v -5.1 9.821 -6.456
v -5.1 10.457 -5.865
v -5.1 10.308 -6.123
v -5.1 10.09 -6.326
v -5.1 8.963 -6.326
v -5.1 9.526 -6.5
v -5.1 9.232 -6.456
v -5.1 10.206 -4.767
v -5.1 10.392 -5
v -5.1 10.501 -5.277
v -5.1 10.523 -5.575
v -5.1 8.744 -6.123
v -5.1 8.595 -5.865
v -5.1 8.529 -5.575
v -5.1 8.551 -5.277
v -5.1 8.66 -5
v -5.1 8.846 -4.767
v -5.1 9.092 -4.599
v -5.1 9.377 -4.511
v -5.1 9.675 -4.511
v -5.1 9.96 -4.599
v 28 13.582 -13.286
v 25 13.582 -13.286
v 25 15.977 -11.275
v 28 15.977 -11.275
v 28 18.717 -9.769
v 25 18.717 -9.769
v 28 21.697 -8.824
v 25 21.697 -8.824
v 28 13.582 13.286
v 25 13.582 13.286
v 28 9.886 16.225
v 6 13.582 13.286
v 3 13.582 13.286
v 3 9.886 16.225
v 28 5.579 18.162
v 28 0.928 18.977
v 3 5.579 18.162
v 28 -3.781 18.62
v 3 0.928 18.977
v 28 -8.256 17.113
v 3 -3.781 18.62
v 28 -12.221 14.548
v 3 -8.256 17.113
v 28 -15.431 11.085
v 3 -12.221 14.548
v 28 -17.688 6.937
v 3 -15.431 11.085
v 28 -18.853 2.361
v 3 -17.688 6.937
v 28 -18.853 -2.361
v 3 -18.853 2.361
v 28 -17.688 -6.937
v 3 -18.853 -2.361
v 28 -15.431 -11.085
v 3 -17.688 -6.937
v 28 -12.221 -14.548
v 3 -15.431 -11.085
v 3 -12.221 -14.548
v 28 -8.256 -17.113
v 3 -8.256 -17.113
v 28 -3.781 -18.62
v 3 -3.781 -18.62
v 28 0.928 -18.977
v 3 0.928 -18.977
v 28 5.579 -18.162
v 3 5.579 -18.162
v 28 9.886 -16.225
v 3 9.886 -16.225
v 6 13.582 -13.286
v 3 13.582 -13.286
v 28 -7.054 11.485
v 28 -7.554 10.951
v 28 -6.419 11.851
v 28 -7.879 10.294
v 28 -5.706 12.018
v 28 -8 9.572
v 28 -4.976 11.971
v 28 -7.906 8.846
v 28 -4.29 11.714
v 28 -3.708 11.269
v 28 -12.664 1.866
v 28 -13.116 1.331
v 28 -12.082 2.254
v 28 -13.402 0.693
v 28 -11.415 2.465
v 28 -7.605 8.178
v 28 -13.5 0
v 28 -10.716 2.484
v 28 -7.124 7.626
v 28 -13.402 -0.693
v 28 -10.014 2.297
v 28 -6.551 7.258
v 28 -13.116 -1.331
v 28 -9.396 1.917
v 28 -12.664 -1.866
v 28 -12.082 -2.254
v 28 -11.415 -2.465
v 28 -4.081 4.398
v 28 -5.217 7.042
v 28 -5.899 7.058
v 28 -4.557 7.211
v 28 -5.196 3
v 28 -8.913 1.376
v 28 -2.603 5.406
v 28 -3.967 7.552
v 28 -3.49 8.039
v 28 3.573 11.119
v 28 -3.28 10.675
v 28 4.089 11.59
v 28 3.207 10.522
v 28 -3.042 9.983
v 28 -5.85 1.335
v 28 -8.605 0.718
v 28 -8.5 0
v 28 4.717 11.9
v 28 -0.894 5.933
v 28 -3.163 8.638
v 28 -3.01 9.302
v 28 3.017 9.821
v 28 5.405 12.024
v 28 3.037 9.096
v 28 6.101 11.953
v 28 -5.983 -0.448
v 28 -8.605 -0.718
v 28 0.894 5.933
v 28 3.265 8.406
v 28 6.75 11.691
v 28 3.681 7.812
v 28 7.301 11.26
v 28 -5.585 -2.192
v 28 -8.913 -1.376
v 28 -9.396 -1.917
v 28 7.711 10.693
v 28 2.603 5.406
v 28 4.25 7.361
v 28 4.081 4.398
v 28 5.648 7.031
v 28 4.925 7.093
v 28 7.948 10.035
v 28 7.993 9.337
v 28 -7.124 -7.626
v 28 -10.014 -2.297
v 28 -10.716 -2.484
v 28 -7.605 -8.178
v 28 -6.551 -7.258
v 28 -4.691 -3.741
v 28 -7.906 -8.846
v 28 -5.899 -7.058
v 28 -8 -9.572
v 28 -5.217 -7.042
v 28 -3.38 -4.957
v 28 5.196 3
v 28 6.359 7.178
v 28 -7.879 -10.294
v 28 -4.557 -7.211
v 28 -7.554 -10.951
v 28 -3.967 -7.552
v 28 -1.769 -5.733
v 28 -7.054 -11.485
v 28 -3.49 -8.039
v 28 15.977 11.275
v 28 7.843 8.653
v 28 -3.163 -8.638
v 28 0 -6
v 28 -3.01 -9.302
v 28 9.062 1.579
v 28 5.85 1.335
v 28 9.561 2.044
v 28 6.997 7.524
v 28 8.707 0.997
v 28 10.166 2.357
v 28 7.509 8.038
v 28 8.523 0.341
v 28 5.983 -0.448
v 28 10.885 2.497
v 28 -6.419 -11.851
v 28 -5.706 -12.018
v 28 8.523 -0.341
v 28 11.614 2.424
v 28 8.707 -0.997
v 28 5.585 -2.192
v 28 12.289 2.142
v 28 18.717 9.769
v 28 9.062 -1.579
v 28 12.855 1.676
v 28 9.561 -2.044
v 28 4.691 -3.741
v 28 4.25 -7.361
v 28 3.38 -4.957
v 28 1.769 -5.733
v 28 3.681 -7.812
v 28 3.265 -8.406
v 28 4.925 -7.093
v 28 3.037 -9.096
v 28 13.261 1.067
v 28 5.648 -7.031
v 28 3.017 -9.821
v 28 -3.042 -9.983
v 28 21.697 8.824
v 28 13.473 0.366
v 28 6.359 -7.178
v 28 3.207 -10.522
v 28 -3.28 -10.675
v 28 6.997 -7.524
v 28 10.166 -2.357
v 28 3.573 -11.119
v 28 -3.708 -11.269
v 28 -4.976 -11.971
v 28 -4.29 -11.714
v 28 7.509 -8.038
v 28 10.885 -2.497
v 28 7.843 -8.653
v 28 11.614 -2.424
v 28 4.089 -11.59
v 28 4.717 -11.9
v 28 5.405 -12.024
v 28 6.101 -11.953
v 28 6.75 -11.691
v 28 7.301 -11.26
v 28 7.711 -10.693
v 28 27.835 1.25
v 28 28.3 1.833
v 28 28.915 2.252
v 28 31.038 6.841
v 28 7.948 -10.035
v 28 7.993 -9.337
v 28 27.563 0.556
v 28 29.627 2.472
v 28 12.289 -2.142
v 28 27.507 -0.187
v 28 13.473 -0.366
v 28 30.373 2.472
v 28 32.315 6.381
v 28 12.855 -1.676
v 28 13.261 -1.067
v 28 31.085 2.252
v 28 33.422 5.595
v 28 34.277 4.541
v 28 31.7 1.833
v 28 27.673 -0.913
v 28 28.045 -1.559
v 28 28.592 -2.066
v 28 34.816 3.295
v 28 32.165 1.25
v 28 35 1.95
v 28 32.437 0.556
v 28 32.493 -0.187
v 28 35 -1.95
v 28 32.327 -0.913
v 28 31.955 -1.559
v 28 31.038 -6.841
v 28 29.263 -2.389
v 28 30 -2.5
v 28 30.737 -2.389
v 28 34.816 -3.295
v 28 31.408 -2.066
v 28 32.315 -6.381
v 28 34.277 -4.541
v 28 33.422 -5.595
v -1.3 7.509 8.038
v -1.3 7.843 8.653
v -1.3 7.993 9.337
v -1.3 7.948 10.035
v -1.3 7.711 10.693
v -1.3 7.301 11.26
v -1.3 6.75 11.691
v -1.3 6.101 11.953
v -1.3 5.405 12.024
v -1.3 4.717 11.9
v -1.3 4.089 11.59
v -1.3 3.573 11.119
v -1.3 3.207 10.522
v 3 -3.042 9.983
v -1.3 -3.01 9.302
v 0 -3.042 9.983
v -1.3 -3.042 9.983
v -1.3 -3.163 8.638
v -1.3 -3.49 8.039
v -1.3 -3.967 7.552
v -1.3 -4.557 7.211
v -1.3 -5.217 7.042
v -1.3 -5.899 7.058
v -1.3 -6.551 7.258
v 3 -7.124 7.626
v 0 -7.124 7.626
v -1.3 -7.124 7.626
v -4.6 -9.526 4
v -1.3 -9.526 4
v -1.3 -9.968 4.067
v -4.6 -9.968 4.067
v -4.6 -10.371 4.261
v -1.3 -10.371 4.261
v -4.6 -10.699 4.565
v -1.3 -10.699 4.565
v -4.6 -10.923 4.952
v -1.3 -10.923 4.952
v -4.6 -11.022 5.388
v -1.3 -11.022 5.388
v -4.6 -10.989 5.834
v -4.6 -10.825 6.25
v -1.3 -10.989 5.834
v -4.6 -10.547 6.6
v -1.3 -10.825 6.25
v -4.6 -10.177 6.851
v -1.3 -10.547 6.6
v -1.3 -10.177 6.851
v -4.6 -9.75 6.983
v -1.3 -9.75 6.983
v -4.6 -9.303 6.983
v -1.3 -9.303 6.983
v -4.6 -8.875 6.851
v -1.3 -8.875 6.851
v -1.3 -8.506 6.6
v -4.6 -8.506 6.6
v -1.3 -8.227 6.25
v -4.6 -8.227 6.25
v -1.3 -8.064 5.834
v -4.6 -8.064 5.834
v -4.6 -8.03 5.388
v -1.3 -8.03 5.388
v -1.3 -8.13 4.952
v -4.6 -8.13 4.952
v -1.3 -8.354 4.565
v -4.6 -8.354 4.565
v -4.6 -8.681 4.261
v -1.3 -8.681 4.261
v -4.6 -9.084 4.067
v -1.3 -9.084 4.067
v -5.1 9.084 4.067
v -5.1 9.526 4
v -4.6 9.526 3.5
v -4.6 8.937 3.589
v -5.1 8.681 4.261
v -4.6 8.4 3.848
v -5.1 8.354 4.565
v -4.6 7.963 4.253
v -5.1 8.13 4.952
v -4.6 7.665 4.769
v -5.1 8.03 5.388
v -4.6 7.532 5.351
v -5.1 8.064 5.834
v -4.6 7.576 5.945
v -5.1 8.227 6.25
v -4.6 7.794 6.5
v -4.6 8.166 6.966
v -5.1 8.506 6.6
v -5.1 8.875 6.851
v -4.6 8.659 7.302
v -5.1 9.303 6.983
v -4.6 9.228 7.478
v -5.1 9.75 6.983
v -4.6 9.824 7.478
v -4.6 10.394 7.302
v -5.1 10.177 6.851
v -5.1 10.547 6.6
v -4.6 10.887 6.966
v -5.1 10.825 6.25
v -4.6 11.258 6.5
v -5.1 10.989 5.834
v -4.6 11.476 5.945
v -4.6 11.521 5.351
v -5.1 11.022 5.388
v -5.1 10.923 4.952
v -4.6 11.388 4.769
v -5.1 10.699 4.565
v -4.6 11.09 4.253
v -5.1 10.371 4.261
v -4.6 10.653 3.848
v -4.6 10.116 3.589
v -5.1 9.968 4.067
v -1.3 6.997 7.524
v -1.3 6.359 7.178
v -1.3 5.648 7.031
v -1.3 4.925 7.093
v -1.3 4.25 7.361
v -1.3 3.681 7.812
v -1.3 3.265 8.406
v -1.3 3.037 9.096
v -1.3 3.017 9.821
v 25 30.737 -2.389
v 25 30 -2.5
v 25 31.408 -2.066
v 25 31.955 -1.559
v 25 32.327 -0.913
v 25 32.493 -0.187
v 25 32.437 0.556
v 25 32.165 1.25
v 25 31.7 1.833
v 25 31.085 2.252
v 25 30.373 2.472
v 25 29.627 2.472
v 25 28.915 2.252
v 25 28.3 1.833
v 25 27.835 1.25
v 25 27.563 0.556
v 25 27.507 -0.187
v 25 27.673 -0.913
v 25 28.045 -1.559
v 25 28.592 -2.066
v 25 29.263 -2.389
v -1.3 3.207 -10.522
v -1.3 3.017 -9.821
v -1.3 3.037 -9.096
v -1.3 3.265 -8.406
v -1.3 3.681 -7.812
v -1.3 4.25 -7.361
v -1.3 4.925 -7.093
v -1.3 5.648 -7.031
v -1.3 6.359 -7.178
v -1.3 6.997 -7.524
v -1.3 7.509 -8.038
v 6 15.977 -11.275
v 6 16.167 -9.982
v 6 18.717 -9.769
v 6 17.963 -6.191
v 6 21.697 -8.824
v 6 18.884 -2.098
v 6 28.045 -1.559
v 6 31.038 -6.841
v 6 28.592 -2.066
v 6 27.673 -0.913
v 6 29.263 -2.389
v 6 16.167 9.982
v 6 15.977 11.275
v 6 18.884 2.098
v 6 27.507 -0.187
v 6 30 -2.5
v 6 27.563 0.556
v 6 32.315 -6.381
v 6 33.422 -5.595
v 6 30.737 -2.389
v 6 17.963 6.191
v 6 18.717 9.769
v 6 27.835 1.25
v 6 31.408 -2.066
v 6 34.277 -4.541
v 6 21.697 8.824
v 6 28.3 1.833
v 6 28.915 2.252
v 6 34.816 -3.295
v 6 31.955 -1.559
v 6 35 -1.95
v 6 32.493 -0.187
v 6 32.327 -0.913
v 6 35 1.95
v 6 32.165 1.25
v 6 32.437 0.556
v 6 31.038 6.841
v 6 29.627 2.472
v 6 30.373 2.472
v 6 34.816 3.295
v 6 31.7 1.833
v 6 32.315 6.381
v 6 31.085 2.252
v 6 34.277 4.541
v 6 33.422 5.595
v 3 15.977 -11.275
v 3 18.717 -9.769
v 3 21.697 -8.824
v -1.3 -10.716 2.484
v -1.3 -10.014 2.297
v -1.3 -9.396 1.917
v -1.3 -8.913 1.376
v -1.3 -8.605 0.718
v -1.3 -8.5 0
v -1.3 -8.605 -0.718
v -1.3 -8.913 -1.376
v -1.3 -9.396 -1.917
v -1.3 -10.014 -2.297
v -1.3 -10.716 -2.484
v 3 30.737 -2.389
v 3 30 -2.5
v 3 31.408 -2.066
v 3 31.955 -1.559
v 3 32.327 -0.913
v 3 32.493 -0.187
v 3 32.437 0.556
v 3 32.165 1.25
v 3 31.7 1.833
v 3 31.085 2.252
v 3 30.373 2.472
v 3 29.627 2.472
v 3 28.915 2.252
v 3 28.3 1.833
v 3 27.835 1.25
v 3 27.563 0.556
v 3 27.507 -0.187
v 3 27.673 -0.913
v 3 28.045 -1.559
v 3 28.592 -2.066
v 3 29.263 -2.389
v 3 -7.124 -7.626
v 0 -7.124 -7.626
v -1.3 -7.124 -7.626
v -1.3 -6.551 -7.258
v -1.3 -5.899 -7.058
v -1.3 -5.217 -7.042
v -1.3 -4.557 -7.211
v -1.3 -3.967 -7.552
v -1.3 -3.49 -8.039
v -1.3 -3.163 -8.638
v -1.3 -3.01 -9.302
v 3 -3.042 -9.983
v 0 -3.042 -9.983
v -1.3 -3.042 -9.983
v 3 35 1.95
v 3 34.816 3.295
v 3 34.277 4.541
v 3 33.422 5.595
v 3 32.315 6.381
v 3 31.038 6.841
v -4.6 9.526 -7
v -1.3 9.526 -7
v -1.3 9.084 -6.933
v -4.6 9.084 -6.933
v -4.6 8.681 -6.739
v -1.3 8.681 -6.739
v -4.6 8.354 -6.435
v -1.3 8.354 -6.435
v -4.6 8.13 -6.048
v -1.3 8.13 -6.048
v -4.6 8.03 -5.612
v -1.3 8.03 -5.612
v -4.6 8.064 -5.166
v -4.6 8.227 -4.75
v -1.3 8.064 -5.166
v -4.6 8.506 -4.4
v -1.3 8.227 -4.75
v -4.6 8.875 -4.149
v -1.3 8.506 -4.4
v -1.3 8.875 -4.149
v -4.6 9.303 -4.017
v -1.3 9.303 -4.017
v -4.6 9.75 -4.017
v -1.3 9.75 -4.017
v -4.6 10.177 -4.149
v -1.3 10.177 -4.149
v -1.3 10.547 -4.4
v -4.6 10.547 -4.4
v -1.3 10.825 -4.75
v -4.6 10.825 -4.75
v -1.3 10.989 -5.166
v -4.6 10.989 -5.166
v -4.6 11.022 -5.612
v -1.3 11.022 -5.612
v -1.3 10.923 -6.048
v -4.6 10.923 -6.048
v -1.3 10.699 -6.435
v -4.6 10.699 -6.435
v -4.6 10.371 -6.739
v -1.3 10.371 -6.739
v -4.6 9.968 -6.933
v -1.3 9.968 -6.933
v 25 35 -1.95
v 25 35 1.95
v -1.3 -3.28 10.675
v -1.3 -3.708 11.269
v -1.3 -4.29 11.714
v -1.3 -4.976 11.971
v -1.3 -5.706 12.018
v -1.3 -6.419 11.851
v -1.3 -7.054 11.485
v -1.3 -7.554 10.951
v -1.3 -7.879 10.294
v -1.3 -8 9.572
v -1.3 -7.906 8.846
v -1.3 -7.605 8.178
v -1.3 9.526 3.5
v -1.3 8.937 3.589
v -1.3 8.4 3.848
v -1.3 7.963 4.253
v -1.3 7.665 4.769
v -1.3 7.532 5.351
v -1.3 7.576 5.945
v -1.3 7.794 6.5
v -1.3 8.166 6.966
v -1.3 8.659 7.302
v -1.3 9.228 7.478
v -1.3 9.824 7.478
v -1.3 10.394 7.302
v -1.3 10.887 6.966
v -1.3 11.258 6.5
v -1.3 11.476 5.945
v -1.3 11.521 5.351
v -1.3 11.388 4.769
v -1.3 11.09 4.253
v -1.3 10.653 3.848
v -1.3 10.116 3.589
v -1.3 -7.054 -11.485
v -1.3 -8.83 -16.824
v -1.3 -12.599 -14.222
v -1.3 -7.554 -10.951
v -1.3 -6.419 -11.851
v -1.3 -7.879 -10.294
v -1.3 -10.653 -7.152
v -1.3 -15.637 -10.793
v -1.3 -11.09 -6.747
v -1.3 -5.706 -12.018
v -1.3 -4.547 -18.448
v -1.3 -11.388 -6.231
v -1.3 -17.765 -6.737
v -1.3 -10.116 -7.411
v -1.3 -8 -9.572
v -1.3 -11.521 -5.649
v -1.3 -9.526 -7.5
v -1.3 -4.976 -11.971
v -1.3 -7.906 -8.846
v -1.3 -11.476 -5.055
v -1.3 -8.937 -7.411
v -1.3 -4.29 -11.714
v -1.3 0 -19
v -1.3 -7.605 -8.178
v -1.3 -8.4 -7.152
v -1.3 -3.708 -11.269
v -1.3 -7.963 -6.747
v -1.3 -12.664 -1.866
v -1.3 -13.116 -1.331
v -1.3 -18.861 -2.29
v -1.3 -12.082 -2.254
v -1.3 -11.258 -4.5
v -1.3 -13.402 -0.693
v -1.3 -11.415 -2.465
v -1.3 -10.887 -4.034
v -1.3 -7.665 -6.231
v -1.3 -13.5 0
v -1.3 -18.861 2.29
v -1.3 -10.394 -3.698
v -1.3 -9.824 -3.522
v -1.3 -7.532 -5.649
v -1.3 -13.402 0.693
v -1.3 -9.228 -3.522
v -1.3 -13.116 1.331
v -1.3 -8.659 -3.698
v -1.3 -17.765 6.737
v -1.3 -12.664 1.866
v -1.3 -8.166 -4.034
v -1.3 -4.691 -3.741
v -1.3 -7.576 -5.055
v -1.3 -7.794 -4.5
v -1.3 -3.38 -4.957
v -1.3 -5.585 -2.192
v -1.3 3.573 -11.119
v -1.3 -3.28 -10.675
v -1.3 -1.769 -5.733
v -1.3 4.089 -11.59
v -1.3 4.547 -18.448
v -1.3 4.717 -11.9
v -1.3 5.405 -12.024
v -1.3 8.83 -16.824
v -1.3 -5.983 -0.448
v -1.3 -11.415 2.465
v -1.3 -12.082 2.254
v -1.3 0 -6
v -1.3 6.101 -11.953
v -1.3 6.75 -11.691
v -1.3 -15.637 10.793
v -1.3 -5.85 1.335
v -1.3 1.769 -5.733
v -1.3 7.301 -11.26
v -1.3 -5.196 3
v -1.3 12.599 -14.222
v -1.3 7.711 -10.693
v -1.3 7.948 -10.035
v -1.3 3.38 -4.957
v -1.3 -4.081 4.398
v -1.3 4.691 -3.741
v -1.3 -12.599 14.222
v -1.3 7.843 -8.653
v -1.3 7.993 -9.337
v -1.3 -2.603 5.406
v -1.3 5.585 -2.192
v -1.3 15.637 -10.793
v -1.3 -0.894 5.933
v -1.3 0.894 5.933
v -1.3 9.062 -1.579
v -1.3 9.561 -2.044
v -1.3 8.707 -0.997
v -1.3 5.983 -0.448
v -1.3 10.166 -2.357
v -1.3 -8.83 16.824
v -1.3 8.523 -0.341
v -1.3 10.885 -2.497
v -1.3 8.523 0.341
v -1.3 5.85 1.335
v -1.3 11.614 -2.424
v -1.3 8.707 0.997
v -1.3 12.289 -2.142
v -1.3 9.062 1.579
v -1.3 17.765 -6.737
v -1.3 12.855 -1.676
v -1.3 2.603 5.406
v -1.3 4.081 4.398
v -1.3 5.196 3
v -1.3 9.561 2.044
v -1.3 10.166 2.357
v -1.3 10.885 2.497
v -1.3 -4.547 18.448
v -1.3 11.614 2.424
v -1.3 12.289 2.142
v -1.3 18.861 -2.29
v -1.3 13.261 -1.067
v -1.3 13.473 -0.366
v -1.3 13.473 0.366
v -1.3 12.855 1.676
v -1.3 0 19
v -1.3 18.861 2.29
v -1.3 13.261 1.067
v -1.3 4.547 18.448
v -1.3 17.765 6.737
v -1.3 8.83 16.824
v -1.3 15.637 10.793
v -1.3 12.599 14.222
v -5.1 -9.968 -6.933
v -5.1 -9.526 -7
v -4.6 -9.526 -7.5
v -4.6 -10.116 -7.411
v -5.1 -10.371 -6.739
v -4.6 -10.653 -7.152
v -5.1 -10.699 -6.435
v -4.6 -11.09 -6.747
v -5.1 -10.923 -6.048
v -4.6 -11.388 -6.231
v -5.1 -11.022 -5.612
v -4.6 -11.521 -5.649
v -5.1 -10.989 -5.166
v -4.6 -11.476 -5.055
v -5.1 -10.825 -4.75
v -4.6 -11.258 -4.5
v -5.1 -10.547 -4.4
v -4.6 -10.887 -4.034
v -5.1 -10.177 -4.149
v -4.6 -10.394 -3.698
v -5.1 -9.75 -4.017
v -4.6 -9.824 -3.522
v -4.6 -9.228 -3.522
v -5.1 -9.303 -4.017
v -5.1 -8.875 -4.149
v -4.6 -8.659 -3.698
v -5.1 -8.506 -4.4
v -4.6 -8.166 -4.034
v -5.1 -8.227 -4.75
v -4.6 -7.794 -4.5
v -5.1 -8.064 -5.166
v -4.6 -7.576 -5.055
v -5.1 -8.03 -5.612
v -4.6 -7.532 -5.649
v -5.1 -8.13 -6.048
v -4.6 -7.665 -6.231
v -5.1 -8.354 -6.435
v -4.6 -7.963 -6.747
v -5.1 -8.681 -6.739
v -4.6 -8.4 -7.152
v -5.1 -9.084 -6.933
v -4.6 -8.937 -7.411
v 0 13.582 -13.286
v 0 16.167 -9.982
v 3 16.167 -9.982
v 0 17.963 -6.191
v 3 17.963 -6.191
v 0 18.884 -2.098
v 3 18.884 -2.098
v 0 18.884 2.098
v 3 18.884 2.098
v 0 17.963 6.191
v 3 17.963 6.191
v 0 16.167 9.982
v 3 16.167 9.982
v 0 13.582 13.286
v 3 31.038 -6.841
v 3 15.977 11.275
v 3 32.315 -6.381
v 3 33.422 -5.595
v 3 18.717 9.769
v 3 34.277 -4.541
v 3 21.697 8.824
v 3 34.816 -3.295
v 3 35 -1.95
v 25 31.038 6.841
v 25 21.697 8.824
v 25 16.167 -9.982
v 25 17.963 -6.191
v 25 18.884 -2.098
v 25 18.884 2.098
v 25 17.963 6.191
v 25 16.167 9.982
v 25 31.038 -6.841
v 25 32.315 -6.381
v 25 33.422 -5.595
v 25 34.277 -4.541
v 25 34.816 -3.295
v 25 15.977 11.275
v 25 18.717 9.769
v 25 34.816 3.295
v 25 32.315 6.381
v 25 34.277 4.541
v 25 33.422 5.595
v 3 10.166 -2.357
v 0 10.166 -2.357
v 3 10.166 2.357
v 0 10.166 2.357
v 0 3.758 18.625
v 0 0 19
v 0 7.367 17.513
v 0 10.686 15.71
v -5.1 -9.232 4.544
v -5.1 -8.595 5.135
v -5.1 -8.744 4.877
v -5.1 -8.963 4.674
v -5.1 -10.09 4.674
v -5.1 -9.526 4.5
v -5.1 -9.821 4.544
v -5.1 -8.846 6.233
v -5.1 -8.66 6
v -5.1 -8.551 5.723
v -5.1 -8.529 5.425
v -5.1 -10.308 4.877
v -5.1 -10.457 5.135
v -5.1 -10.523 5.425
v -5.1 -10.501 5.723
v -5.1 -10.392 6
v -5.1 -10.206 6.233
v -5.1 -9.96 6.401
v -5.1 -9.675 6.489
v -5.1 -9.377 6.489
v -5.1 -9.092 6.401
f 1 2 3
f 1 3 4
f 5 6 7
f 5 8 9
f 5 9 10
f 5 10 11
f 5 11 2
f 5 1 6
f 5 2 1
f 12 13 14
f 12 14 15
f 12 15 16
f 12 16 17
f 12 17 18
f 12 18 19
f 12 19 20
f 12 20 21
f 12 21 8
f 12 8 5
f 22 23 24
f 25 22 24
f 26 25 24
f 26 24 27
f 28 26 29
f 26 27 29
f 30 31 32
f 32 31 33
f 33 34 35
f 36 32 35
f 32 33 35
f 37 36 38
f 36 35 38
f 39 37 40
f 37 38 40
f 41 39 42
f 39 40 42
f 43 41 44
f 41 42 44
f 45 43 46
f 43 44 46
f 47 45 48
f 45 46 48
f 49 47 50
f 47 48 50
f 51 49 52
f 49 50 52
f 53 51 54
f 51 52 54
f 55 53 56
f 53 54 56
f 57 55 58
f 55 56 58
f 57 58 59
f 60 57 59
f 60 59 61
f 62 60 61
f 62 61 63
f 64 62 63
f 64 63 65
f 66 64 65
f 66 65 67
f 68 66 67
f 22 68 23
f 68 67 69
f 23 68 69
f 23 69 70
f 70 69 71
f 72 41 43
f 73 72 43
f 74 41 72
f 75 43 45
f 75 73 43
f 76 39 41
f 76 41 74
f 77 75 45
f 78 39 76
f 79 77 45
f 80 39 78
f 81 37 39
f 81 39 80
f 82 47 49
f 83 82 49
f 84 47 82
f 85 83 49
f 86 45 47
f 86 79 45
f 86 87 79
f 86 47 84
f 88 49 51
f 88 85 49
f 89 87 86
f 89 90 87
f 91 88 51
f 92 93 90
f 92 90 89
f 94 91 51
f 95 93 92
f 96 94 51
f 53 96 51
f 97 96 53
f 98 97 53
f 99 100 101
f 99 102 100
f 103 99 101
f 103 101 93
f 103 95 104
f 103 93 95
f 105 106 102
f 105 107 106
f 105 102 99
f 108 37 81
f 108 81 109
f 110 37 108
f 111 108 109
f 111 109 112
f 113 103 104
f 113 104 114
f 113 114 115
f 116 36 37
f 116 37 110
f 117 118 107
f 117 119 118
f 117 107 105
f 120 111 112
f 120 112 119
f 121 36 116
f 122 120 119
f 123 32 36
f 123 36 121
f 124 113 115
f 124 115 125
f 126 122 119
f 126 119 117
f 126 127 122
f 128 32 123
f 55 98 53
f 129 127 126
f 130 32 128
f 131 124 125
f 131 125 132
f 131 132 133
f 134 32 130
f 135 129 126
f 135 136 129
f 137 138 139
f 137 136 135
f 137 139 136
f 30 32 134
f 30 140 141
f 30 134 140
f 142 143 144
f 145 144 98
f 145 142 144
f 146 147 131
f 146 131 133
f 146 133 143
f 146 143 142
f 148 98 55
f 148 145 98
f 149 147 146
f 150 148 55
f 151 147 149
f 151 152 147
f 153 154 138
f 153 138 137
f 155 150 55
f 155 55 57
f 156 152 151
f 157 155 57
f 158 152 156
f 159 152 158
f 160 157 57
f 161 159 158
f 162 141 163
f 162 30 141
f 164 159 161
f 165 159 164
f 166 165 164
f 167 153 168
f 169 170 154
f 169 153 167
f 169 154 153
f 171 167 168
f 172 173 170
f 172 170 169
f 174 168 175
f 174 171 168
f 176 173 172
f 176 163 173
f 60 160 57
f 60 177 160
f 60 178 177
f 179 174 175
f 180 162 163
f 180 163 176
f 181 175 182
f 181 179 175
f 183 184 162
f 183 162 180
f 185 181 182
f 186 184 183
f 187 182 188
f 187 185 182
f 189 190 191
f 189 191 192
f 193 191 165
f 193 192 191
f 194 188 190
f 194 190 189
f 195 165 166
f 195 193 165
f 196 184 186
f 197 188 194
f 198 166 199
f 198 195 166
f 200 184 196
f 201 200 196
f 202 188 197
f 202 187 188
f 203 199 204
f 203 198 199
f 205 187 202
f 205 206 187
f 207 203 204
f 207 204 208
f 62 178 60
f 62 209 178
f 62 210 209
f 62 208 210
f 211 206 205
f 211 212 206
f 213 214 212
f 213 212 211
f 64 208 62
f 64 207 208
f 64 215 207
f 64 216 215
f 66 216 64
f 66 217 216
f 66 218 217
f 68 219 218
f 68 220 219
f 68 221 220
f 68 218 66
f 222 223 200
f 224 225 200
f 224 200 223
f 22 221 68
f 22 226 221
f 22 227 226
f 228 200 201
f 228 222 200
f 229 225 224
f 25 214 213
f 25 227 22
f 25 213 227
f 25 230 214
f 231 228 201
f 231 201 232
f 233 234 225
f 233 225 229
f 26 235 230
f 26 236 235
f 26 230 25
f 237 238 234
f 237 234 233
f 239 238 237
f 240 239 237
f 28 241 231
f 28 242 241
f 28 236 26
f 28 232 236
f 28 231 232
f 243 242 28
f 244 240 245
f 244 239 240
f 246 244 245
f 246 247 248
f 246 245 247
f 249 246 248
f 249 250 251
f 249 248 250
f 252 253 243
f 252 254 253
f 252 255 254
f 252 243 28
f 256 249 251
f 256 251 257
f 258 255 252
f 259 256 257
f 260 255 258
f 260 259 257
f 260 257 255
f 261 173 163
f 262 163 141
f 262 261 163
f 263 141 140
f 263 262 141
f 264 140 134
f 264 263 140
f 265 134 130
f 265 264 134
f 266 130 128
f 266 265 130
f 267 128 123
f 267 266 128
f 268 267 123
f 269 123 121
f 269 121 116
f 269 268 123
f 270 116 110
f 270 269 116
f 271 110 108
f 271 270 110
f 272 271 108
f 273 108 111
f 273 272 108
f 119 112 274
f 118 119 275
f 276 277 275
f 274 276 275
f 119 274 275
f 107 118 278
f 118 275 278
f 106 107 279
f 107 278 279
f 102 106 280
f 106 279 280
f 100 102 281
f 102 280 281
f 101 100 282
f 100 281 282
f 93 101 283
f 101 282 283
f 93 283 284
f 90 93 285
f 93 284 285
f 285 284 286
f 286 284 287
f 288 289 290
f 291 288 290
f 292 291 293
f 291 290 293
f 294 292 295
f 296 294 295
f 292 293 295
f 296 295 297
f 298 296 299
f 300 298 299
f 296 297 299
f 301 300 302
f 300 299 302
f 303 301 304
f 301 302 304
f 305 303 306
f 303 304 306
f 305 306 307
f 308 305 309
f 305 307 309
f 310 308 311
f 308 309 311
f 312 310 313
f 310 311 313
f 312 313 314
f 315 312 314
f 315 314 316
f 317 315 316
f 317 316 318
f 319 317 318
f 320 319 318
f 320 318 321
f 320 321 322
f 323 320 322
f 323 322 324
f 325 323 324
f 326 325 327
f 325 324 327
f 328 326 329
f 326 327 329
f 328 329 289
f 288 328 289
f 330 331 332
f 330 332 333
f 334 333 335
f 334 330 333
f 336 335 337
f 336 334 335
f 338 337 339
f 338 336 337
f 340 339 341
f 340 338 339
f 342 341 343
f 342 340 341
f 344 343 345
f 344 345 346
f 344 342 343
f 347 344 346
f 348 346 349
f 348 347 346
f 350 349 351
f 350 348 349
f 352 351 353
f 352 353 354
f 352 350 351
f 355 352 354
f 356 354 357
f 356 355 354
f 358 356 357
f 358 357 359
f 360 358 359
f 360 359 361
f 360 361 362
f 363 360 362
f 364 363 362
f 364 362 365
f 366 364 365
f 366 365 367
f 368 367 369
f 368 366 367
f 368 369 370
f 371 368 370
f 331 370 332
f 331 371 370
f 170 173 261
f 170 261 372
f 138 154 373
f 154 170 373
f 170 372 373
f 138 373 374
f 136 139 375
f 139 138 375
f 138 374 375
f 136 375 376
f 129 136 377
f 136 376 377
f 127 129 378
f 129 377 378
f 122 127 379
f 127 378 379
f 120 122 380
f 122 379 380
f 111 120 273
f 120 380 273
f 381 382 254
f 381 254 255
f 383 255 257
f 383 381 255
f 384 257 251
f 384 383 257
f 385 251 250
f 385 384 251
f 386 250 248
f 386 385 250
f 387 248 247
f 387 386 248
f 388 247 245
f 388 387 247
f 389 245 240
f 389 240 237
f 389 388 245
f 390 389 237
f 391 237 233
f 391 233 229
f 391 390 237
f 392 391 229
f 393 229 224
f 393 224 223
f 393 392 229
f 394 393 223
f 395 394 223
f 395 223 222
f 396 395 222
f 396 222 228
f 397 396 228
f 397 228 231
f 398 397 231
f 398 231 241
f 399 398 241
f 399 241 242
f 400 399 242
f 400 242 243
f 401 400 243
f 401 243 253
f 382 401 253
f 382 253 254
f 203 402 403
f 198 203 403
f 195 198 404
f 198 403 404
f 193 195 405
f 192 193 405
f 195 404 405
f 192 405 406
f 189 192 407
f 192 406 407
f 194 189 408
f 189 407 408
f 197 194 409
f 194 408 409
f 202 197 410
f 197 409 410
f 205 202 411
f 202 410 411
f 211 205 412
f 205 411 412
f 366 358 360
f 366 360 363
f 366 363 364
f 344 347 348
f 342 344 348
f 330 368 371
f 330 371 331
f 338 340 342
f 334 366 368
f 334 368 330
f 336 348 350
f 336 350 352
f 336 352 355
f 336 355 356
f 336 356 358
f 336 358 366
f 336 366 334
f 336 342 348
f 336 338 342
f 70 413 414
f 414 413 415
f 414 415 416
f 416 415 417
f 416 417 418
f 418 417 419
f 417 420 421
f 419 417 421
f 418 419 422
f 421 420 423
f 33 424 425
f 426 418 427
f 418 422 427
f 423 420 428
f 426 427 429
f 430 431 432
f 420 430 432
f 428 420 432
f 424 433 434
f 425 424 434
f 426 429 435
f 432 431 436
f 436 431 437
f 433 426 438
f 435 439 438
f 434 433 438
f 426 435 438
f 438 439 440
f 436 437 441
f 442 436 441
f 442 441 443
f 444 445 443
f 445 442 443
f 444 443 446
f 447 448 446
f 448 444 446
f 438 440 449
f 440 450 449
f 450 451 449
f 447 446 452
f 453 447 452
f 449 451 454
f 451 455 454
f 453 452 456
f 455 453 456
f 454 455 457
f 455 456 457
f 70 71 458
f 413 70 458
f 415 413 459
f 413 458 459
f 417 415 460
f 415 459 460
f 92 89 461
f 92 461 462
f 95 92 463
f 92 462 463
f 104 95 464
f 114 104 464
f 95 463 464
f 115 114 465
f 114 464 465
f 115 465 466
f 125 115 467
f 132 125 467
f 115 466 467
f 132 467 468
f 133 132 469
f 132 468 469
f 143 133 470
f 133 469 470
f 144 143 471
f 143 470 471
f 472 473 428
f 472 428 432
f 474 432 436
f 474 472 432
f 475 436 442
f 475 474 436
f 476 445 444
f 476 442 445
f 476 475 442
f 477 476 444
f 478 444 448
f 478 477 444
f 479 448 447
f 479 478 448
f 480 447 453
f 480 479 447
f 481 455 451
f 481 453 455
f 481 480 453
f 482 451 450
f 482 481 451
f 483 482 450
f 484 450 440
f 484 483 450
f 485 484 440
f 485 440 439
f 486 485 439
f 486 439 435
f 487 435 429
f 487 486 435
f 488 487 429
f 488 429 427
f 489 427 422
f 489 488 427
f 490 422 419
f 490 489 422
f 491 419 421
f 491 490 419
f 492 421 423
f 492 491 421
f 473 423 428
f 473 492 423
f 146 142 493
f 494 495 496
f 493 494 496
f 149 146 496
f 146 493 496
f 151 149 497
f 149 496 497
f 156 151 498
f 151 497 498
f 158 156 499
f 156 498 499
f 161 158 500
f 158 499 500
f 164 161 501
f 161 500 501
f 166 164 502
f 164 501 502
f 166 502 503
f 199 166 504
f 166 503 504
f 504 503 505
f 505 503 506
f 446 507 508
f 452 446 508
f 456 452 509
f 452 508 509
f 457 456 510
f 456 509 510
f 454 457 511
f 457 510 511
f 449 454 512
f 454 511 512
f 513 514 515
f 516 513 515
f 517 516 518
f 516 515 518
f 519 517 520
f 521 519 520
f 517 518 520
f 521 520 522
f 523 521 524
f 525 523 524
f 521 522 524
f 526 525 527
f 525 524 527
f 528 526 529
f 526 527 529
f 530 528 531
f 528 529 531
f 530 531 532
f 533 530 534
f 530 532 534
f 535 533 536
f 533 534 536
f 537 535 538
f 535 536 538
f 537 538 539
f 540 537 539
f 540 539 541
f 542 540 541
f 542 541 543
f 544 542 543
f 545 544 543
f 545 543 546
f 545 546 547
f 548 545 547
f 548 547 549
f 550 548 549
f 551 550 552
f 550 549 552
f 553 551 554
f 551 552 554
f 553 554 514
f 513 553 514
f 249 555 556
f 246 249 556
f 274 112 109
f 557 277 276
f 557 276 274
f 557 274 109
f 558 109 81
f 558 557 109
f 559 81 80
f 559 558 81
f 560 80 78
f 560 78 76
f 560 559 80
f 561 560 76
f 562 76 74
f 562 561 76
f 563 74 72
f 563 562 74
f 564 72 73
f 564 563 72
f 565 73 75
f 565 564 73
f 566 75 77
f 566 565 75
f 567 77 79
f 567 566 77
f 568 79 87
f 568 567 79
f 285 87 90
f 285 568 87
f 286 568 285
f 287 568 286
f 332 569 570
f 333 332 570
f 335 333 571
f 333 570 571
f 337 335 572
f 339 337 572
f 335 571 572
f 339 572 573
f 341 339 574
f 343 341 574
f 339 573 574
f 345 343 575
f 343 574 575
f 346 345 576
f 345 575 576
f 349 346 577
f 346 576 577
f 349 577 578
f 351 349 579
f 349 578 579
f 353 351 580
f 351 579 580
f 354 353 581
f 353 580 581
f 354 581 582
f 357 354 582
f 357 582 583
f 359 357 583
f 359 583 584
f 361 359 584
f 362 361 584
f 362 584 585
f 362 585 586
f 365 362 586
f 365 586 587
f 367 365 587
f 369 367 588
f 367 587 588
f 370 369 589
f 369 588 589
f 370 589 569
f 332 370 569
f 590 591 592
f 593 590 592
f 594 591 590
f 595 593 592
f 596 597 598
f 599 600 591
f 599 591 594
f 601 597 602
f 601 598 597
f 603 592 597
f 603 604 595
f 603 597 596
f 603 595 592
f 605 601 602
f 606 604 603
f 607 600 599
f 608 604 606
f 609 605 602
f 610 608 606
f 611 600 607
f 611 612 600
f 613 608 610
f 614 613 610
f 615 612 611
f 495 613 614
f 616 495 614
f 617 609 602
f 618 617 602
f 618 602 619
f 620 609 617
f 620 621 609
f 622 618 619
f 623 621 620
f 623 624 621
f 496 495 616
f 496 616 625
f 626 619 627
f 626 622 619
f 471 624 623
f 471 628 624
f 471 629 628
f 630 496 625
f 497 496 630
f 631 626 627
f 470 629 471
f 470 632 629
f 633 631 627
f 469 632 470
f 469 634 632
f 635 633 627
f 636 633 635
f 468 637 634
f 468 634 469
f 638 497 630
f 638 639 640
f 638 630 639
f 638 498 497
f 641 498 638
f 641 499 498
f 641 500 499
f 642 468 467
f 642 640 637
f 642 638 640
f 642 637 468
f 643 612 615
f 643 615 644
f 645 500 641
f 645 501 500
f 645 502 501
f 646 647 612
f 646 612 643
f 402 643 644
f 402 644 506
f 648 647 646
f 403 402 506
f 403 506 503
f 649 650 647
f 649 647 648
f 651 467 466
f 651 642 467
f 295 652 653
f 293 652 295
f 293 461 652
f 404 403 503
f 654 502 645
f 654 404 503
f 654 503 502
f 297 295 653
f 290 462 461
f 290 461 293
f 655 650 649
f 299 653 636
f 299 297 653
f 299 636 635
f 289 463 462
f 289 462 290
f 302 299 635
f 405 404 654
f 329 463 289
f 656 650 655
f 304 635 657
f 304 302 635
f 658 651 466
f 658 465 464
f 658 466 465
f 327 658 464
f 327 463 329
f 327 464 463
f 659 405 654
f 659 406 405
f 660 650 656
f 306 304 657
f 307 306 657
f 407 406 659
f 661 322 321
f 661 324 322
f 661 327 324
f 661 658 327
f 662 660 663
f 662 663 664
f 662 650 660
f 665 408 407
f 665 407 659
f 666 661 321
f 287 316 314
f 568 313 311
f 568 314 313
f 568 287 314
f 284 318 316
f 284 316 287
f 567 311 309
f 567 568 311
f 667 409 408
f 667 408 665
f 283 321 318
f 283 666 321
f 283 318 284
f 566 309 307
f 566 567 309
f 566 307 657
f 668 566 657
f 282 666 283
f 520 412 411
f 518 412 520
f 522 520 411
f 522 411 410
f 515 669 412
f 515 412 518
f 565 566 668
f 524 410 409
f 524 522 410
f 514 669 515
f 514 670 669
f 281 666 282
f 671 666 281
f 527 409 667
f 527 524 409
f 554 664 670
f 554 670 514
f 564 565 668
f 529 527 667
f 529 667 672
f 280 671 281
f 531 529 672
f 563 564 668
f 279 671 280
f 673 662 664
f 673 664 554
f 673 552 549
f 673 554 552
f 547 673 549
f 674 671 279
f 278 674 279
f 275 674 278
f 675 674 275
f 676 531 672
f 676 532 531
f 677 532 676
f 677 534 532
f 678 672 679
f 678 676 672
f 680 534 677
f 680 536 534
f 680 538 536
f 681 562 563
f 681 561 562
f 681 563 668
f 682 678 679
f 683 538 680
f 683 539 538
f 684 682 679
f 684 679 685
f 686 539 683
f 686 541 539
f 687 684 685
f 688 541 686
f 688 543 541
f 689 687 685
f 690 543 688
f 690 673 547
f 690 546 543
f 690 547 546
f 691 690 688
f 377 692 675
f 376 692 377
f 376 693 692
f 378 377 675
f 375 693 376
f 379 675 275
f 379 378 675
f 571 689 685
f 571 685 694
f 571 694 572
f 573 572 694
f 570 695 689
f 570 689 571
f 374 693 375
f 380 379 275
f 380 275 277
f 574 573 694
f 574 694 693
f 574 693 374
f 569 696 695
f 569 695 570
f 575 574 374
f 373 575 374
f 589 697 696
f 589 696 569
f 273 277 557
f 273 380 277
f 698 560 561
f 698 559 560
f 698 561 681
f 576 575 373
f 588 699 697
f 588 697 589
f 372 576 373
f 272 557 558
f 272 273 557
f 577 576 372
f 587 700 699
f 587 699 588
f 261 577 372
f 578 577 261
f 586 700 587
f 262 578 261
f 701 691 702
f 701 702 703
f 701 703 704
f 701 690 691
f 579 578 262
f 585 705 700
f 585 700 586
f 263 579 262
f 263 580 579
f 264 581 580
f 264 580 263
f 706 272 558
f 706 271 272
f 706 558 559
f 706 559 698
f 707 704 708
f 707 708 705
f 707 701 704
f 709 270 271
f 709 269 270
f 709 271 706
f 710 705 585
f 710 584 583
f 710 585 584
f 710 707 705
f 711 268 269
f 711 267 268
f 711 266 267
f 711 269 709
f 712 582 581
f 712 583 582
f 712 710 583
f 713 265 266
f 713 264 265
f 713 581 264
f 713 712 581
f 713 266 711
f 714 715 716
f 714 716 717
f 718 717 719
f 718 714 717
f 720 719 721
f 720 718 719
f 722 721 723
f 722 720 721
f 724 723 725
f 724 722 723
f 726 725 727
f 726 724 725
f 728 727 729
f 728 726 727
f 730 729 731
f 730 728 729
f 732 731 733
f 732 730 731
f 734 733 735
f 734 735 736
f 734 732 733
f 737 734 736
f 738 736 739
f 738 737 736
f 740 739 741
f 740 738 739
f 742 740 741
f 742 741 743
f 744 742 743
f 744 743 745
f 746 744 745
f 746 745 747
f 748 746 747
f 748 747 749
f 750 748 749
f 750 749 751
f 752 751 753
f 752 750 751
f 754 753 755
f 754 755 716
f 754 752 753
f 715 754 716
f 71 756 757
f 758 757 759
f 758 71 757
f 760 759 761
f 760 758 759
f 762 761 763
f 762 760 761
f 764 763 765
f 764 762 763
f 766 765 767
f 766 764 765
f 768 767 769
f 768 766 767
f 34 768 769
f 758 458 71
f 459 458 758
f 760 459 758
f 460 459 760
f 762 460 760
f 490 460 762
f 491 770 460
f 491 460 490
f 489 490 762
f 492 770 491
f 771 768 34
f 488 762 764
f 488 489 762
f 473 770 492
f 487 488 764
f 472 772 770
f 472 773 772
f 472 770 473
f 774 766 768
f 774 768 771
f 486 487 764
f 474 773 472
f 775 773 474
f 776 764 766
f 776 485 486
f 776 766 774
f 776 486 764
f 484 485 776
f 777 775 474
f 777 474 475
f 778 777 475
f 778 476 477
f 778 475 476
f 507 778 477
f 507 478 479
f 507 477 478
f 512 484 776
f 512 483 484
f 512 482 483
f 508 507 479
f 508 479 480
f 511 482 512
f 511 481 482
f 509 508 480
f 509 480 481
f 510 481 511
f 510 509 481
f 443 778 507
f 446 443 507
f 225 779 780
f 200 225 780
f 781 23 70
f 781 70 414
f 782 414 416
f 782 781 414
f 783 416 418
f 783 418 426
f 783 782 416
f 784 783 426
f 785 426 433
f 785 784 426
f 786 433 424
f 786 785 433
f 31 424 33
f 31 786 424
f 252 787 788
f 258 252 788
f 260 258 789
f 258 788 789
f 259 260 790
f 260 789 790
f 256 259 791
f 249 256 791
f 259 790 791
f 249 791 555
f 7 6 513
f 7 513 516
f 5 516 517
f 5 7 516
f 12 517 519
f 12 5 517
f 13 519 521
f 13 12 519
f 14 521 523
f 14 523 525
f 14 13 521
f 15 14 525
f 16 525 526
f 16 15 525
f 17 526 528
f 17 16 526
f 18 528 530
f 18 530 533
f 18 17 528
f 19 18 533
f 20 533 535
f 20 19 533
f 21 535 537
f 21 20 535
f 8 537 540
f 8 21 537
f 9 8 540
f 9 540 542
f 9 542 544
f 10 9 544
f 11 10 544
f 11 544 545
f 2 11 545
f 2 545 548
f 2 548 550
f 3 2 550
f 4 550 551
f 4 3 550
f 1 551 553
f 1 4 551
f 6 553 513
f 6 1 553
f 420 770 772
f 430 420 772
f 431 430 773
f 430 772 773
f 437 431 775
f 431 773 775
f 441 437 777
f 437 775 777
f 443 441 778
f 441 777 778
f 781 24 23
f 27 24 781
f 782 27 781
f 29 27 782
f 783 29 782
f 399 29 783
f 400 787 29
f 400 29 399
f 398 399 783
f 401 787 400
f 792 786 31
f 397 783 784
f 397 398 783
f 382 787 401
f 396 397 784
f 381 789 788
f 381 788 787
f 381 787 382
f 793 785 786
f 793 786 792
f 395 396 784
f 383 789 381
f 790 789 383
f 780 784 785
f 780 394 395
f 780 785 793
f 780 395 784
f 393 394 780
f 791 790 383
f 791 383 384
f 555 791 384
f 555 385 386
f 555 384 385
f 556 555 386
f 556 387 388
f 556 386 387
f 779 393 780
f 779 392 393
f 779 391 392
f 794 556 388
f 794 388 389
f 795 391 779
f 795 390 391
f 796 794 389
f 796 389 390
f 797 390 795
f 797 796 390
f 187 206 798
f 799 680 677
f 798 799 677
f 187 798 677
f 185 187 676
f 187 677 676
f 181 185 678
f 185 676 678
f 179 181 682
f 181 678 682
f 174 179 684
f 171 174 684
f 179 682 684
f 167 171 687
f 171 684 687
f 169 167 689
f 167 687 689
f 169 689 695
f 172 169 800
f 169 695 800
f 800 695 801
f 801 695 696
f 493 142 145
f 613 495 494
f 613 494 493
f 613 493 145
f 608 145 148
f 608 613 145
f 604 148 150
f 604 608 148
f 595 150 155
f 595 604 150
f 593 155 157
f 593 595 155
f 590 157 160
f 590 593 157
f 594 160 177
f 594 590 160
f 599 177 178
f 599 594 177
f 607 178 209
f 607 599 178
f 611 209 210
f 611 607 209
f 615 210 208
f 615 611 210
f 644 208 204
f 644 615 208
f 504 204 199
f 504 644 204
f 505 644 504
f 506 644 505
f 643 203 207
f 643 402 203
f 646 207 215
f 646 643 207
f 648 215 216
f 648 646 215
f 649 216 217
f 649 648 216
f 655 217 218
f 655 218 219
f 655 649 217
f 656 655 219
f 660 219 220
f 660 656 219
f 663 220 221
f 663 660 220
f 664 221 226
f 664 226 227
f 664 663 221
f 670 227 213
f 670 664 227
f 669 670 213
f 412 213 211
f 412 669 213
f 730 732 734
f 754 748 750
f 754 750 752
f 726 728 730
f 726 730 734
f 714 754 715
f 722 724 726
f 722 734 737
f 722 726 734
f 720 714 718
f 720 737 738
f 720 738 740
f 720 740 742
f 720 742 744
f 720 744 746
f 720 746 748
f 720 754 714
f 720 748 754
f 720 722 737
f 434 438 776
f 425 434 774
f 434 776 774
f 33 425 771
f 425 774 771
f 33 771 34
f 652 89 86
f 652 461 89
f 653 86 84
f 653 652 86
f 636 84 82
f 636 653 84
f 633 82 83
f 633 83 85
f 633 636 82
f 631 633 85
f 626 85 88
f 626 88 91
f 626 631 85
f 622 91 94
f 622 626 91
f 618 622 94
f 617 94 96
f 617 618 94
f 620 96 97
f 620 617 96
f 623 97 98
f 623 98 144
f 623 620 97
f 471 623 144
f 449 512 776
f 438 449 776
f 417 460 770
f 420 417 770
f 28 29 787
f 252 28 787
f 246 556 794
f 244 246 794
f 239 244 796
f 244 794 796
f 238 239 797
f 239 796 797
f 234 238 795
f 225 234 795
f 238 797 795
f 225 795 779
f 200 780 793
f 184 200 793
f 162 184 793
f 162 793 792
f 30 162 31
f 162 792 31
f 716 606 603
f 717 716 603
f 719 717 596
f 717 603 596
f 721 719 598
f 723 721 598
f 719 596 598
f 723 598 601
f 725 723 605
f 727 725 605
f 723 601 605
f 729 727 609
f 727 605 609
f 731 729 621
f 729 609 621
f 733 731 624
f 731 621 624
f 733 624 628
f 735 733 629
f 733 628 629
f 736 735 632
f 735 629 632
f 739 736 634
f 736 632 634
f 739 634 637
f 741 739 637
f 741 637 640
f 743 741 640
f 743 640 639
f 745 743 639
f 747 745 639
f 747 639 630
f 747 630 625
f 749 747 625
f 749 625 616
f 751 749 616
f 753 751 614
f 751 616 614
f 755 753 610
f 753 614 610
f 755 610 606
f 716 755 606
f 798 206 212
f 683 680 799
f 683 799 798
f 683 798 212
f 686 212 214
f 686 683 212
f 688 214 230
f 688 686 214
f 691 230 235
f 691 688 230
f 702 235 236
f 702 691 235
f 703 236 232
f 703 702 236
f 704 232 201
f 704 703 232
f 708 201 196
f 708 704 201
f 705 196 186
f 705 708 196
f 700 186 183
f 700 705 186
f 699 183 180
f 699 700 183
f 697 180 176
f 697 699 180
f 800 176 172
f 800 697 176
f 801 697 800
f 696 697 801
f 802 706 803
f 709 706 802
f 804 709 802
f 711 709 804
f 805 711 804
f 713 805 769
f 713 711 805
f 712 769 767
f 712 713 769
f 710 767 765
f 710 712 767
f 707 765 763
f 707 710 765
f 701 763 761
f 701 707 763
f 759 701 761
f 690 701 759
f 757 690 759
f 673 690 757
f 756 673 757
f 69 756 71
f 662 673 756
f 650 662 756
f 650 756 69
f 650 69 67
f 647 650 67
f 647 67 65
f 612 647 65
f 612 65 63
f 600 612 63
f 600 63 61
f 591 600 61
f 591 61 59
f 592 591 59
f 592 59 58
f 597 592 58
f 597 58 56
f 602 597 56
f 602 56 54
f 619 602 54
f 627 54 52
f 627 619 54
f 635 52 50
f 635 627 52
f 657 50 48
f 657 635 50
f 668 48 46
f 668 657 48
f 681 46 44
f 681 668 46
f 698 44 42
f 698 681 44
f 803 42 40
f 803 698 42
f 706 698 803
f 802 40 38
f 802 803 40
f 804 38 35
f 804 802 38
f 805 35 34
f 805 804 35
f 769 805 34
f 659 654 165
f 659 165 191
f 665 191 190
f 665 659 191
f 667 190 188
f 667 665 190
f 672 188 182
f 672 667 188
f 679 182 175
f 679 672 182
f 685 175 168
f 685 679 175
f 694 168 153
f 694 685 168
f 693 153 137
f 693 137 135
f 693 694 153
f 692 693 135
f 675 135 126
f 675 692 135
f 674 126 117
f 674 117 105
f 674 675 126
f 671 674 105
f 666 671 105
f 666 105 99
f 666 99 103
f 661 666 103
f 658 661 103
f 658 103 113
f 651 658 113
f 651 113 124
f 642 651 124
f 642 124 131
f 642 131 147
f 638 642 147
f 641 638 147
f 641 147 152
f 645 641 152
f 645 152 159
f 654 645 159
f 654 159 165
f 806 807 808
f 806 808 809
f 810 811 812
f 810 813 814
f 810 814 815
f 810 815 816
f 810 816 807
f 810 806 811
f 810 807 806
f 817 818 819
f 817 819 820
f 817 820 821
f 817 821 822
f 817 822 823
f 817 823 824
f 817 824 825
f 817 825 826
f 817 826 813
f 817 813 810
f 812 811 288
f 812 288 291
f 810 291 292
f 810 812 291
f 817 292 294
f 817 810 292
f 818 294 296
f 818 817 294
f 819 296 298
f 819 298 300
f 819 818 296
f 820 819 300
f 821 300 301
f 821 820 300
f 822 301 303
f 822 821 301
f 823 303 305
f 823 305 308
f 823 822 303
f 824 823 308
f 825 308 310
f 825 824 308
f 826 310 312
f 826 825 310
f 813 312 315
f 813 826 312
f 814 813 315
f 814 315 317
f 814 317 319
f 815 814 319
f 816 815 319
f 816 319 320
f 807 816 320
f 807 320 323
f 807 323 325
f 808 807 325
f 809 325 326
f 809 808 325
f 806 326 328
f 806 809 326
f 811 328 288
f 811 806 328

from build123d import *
from build123d.topology import SkipClean

# Parameters (mm, degrees)
SKETCH_1_R          = 19
SKETCH_1_R_2        = 2
SKETCH_1_R_3        = 11
EXTRUDE_1_DEPTH     = 3
EXTRUDE_START       = -3
EXTRUDE_2_DEPTH     = 3
FILLET_1_R          = 3
SKETCH_5_R          = 2.5
EXTRUDE_3_DEPTH     = 3
FILLET_2_R          = 16
FILLET_3_R          = 5
EXTRUDE_START_2     = 8
SKETCH_8_R          = 19
SKETCH_8_R_2        = 2
EXTRUDE_5_DEPTH     = 8
SKETCH_9_R          = 2
SKETCH_9_R_2        = 2.5
EXTRUDE_6_DEPTH     = 25
CUT_EXTRUDE_START   = -19
CUT_EXTRUDE_1_DEPTH = 19
EXTRUDE_START_3     = -36
SKETCH_12_R         = 19
SKETCH_12_R_2       = 11
EXTRUDE_7_DEPTH     = 36
SKETCH_13_R         = 6
EXTRUDE_8_DEPTH     = 36
CUT_EXTRUDE_START_2 = -36
SKETCH_14_R         = 2.5
CUT_EXTRUDE_2_DEPTH = 36
SKETCH_15_R         = 28.71288773
CUT_EXTRUDE_3_DEPTH = 6.7
SKETCH_17_R         = 2
SKETCH_17_R_2       = 1.5
EXTRUDE_9_DEPTH     = 3.8
CHAMFER_2_SIZE      = 0.5
CUT_EXTRUDE_START_3 = -3
CUT_EXTRUDE_4_DEPTH = 3


with BuildPart() as part:
    # 草图1 → 凸台-拉伸1 (new body)
    with BuildSketch(Plane(origin=(0, 0, 0), x_dir=(0, 0, -1), z_dir=(1, 0, 0))):
        Circle(SKETCH_1_R)
        with Locations((0, -15)):
            Circle(SKETCH_1_R_2, mode=Mode.SUBTRACT)
        with Locations((0, 13.5)):
            Circle(SKETCH_1_R_2, mode=Mode.SUBTRACT)
        with Locations((11.691342951, -6.75)):
            Circle(SKETCH_1_R_2, mode=Mode.SUBTRACT)
        with Locations((-12.990381057, 7.5)):
            Circle(SKETCH_1_R_2, mode=Mode.SUBTRACT)
        with Locations((-11.691342951, -6.75)):
            Circle(SKETCH_1_R_2, mode=Mode.SUBTRACT)
        with Locations((12.990381057, 7.5)):
            Circle(SKETCH_1_R_2, mode=Mode.SUBTRACT)
        Circle(SKETCH_1_R_3, mode=Mode.SUBTRACT)
    extrude(amount=EXTRUDE_1_DEPTH)

    # 草图3 → 凸台-拉伸2 (add)
    with BuildSketch(Plane(origin=(3, 0, 0), x_dir=(0, 0, -1), z_dir=(1, 0, 0)).offset(EXTRUDE_START)):
        with BuildLine():
            ThreePointArc((-2.795361016, 10.638888889), (0, 9.5), (2.795361016, 10.638888889))
            ThreePointArc((2.795361016, 10.638888889), (0, 11), (-2.795361016, 10.638888889))
        make_face()
        with BuildLine():
            ThreePointArc((10.611228554, -2.898590792), (8.227241336, -4.75), (7.815867538, -7.740298097))
            ThreePointArc((7.815867538, -7.740298097), (9.526279442, -5.5), (10.611228554, -2.898590792))
        make_face()
        with BuildLine():
            ThreePointArc((-7.815867538, -7.740298097), (-8.227241336, -4.75), (-10.611228554, -2.898590792))
            ThreePointArc((-10.611228554, -2.898590792), (-9.526279442, -5.5), (-7.815867538, -7.740298097))
        make_face()
    extrude(amount=EXTRUDE_2_DEPTH)

    # 圆角1
    fillet_1_edges = [part.edges().sort_by_distance(p)[0] for p in [
        (1.5, 10.638888889, 2.795361016),
        (1.5, 10.638888889, -2.795361016),
        (1.5, -2.898590792, -10.611228554),
        (1.5, -7.740298097, -7.815867538),
        (1.5, -7.740298097, 7.815867538),
        (1.5, -2.898590792, 10.611228554),
    ]]
    fillet(fillet_1_edges, radius=FILLET_1_R)

    # 草图5 → 凸台-拉伸3 (add)
    with BuildSketch(Plane(origin=(3, 0, 0), x_dir=(0, 0, -1), z_dir=(1, 0, 0)).offset(EXTRUDE_START)):
        with BuildLine():
            Line((-6, 35), (-10, 16.155494421))
            ThreePointArc((-10, 16.155494421), (0, 19), (10, 16.155494421))
            Line((10, 16.155494421), (6, 35))
            Line((6, 35), (-6, 35))
        make_face()
        with Locations((0, 30)):
            Circle(SKETCH_5_R, mode=Mode.SUBTRACT)
    extrude(amount=EXTRUDE_3_DEPTH)

    # 圆角2
    fillet_2_edges = [part.edges().sort_by_distance(p)[0] for p in [
        (1.5, 16.155494421, 10),
        (1.5, 16.155494421, -10),
    ]]
    fillet(fillet_2_edges, radius=FILLET_2_R)

    # 圆角3
    fillet_3_edges = [part.edges().sort_by_distance(p)[0] for p in [
        (1.5, 35, -6),
        (1.5, 35, 6),
    ]]
    fillet(fillet_3_edges, radius=FILLET_3_R)

    # 草图8 → 凸台-拉伸5 (add)
    with BuildSketch(Plane.ZY.offset(EXTRUDE_START_2)):
        Circle(SKETCH_8_R)
        with Locations((0, -15)):
            Circle(SKETCH_8_R_2, mode=Mode.SUBTRACT)
        with Locations((-11.691342951, -6.75)):
            Circle(SKETCH_8_R_2, mode=Mode.SUBTRACT)
        with Locations((11.691342951, -6.75)):
            Circle(SKETCH_8_R_2, mode=Mode.SUBTRACT)
        with Locations((12.990381057, 7.5)):
            Circle(SKETCH_8_R_2, mode=Mode.SUBTRACT)
        with Locations((0, 13.5)):
            Circle(SKETCH_8_R_2, mode=Mode.SUBTRACT)
        with Locations((-12.990381057, 7.5)):
            Circle(SKETCH_8_R_2, mode=Mode.SUBTRACT)
        with BuildLine():
            ThreePointArc((9.557371648, -3.366781639), (10.505068504, -2.412656367), (10.940728111, -1.140380819))
            ThreePointArc((10.940728111, -1.140380819), (9.526279442, 5.5), (4.482765296, 10.045138889))
            ThreePointArc((4.482765296, 10.045138889), (3.163112547, 10.303984377), (1.862967396, 9.96031746))
            ThreePointArc((1.862967396, 9.96031746), (0, 9.5), (-1.862967396, 9.96031746))
            ThreePointArc((-1.862967396, 9.96031746), (-3.163112547, 10.303984377), (-4.482765296, 10.045138889))
            ThreePointArc((-4.482765296, 10.045138889), (-9.526279442, 5.5), (-10.940728111, -1.140380819))
            ThreePointArc((-10.940728111, -1.140380819), (-10.505068504, -2.412656367), (-9.557371648, -3.366781639))
            ThreePointArc((-9.557371648, -3.366781639), (-8.227241336, -4.75), (-7.694404252, -6.593535821))
            ThreePointArc((-7.694404252, -6.593535821), (-7.341955957, -7.89132801), (-6.457962814, -8.90475807))
            ThreePointArc((-6.457962814, -8.90475807), (0, -11), (6.457962814, -8.90475807))
            ThreePointArc((6.457962814, -8.90475807), (7.341955957, -7.89132801), (7.694404252, -6.593535821))
            ThreePointArc((7.694404252, -6.593535821), (8.227241336, -4.75), (9.557371648, -3.366781639))
        make_face(mode=Mode.SUBTRACT)
    extrude(amount=-EXTRUDE_5_DEPTH)

    # 草图9 → 凸台-拉伸6 (add)
    with BuildSketch(Plane(origin=(3, 0, 0), x_dir=(0, 0, -1), z_dir=(1, 0, 0))):
        with BuildLine():
            Line((8.823674386, 21.697313072), (6.840948182, 31.038186825))
            ThreePointArc((6.840948182, 31.038186825), (5.097065624, 33.885288543), (1.94991883, 35))
            Line((1.94991883, 35), (-1.94991883, 35))
            ThreePointArc((-1.94991883, 35), (-5.097065624, 33.885288543), (-6.840948182, 31.038186825))
            Line((-6.840948182, 31.038186825), (-8.823674386, 21.697313072))
            ThreePointArc((-8.823674386, 21.697313072), (-10.455022048, 17.309705025), (-13.286411369, 13.582020209))
            ThreePointArc((-13.286411369, 13.582020209), (0, -19), (13.286411369, 13.582020209))
            ThreePointArc((13.286411369, 13.582020209), (10.455022048, 17.309705025), (8.823674386, 21.697313072))
        make_face()
        with Locations(Location((0, -15, 0), (0, 0, 180))):
            Circle(SKETCH_9_R, mode=Mode.SUBTRACT)
        with Locations(Location((11.691342951, -6.75, 0), (0, 0, 180))):
            Circle(SKETCH_9_R, mode=Mode.SUBTRACT)
        with Locations(Location((-11.691342951, -6.75, 0), (0, 0, 180))):
            Circle(SKETCH_9_R, mode=Mode.SUBTRACT)
        with Locations(Location((12.990381057, 7.5, 0), (0, 0, 180))):
            Circle(SKETCH_9_R, mode=Mode.SUBTRACT)
        with Locations(Location((-12.990381057, 7.5, 0), (0, 0, 180))):
            Circle(SKETCH_9_R, mode=Mode.SUBTRACT)
        with Locations(Location((0, 13.5, 0), (0, 0, 180))):
            Circle(SKETCH_9_R, mode=Mode.SUBTRACT)
        with Locations((0, 30)):
            Circle(SKETCH_9_R_2, mode=Mode.SUBTRACT)
        with BuildLine():
            ThreePointArc((6.457962814, -8.90475807), (7.341955957, -7.89132801), (7.694404252, -6.593535821))
            ThreePointArc((7.694404252, -6.593535821), (8.227241336, -4.75), (9.557371648, -3.366781639))
            ThreePointArc((9.557371648, -3.366781639), (10.505068504, -2.412656367), (10.940728111, -1.140380819))
            ThreePointArc((10.940728111, -1.140380819), (9.526279442, 5.5), (4.482765296, 10.045138889))
            ThreePointArc((4.482765296, 10.045138889), (3.163112547, 10.303984377), (1.862967396, 9.96031746))
            ThreePointArc((1.862967396, 9.96031746), (0, 9.5), (-1.862967396, 9.96031746))
            ThreePointArc((-1.862967396, 9.96031746), (-3.163112547, 10.303984377), (-4.482765296, 10.045138889))
            ThreePointArc((-4.482765296, 10.045138889), (-9.526279442, 5.5), (-10.940728111, -1.140380819))
            ThreePointArc((-10.940728111, -1.140380819), (-10.505068504, -2.412656367), (-9.557371648, -3.366781639))
            ThreePointArc((-9.557371648, -3.366781639), (-8.227241336, -4.75), (-7.694404252, -6.593535821))
            ThreePointArc((-7.694404252, -6.593535821), (-7.341955957, -7.89132801), (-6.457962814, -8.90475807))
            ThreePointArc((-6.457962814, -8.90475807), (0, -11), (6.457962814, -8.90475807))
        make_face(mode=Mode.SUBTRACT)
    extrude(amount=EXTRUDE_6_DEPTH)

    # 草图11 → 切除-拉伸1 (cut)
    with BuildSketch(Plane.ZY.offset(-6).offset(CUT_EXTRUDE_START)):
        with BuildLine():
            Line((-6.840948182, 31.038186825), (-8.823674386, 21.697313072))
            ThreePointArc((-8.823674386, 21.697313072), (-10.455022048, 17.309705025), (-13.286411369, 13.582020209))
            ThreePointArc((-13.286411369, 13.582020209), (0, 19), (13.286411369, 13.582020209))
            ThreePointArc((13.286411369, 13.582020209), (10.455022048, 17.309705025), (8.823674386, 21.697313072))
            Line((8.823674386, 21.697313072), (6.840948182, 31.038186825))
            ThreePointArc((6.840948182, 31.038186825), (5.097065624, 33.885288543), (1.94991883, 35))
            Line((1.94991883, 35), (-1.94991883, 35))
            ThreePointArc((-1.94991883, 35), (-5.097065624, 33.885288543), (-6.840948182, 31.038186825))
        make_face()
    extrude(amount=CUT_EXTRUDE_1_DEPTH, mode=Mode.SUBTRACT)

    # 草图12 → 凸台-拉伸7 (add)
    with BuildSketch(Plane(origin=(28, 0, 0), x_dir=(0, 0, -1), z_dir=(1, 0, 0)).offset(EXTRUDE_START_3)):
        with Locations(Location((0, 0, 0), (0, 0, 180))):
            Circle(SKETCH_12_R)
        Circle(SKETCH_12_R_2, mode=Mode.SUBTRACT)
    extrude(amount=EXTRUDE_7_DEPTH)

    # 草图13 → 凸台-拉伸8 (add)
    with BuildSketch(Plane(origin=(28, 0, 0), x_dir=(0, 0, -1), z_dir=(1, 0, 0)).offset(EXTRUDE_START_3)):
        with BuildLine():
            ThreePointArc((-10.522152508, 3.206915432), (-11, 0), (-10.522152508, -3.206915432))
            ThreePointArc((-10.522152508, -3.206915432), (-7.361215932, -4.25), (-8.038346486, -7.508993659))
            ThreePointArc((-8.038346486, -7.508993659), (-5.5, -9.526279442), (-2.483806022, -10.715909091))
            ThreePointArc((-2.483806022, -10.715909091), (0, -8.5), (2.483806022, -10.715909091))
            ThreePointArc((2.483806022, -10.715909091), (5.5, -9.526279442), (8.038346486, -7.508993659))
            ThreePointArc((8.038346486, -7.508993659), (7.361215932, -4.25), (10.522152508, -3.206915432))
            ThreePointArc((10.522152508, -3.206915432), (11, 0), (10.522152508, 3.206915432))
            ThreePointArc((10.522152508, 3.206915432), (7.361215932, 4.25), (8.038346486, 7.508993659))
            ThreePointArc((8.038346486, 7.508993659), (5.5, 9.526279442), (2.483806022, 10.715909091))
            ThreePointArc((2.483806022, 10.715909091), (0, 8.5), (-2.483806022, 10.715909091))
            ThreePointArc((-2.483806022, 10.715909091), (-5.5, 9.526279442), (-8.038346486, 7.508993659))
            ThreePointArc((-8.038346486, 7.508993659), (-7.361215932, 4.25), (-10.522152508, 3.206915432))
        make_face()
        Circle(SKETCH_13_R, mode=Mode.SUBTRACT)
    extrude(amount=EXTRUDE_8_DEPTH)

    # 草图14 → 切除-拉伸2 (cut)
    with SkipClean():  # the faces are left unmerged after this step: merging them gives an invalid solid
        with BuildSketch(Plane(origin=(28, 0, 0), x_dir=(0, 0, -1), z_dir=(1, 0, 0)).offset(CUT_EXTRUDE_START_2)):
            with Locations((0, 11)):
                Circle(SKETCH_14_R)
            with Locations((-9.526279442, 5.5)):
                Circle(SKETCH_14_R)
            with Locations((-9.526279442, -5.5)):
                Circle(SKETCH_14_R)
            with Locations((0, -11)):
                Circle(SKETCH_14_R)
            with Locations((9.526279442, -5.5)):
                Circle(SKETCH_14_R)
            with Locations((9.526279442, 5.5)):
                Circle(SKETCH_14_R)
        extrude(amount=CUT_EXTRUDE_2_DEPTH, mode=Mode.SUBTRACT)

    # 草图15 → 切除-拉伸3 (cut)
    with SkipClean():  # the faces are left unmerged after this step: merging them gives an invalid solid
        with BuildSketch(Plane.ZY.offset(8)):
            Circle(SKETCH_15_R)
        extrude(amount=-CUT_EXTRUDE_3_DEPTH, mode=Mode.SUBTRACT)

    # 草图17 → 凸台-拉伸9 (add)
    with SkipClean():  # the faces are left unmerged after this step: merging them gives an invalid solid
        with BuildSketch(Plane.ZY.offset(1.3)):
            with Locations(Location((-5.5, -9.526279442, 0), (0, 0, 180))):
                Circle(SKETCH_17_R)
            with Locations(Location((-5.5, 9.526279442, 0), (0, 0, 180))):
                Circle(SKETCH_17_R_2)
            with Locations(Location((5.5, 9.526279442, 0), (0, 0, 180))):
                Circle(SKETCH_17_R)
            with Locations(Location((5.5, -9.526279442, 0), (0, 0, 180))):
                Circle(SKETCH_17_R_2)
        extrude(amount=EXTRUDE_9_DEPTH)

    # 倒角2
    chamfer_2_edges = [part.edges().sort_by_distance(p)[0] for p in [
        (-5.1, -9.526279442, -3.5),
        (-5.1, 9.526279442, -4),
        (-5.1, 9.526279442, 7.5),
        (-5.1, -9.526279442, 7),
    ]]
    chamfer(chamfer_2_edges, length=CHAMFER_2_SIZE)

    # 草图19 → 切除-拉伸4 (cut)
    with SkipClean():  # the faces are left unmerged after this step: merging them gives an invalid solid
        with BuildSketch(Plane.ZY.offset(CUT_EXTRUDE_START_3)):
            with BuildLine():
                Line((8.823674386, 21.697313072), (6.840948182, 31.038186825))
                ThreePointArc((6.840948182, 31.038186825), (5.097065624, 33.885288543), (1.94991883, 35))
                Line((1.94991883, 35), (-1.94991883, 35))
                ThreePointArc((-1.94991883, 35), (-5.097065624, 33.885288543), (-6.840948182, 31.038186825))
                Line((-6.840948182, 31.038186825), (-8.823674386, 21.697313072))
                ThreePointArc((-8.823674386, 21.697313072), (-10.455022048, 17.309705025), (-13.286411369, 13.582020209))
                ThreePointArc((-13.286411369, 13.582020209), (0, 19), (13.286411369, 13.582020209))
                ThreePointArc((13.286411369, 13.582020209), (10.455022048, 17.309705025), (8.823674386, 21.697313072))
            make_face()
        extrude(amount=CUT_EXTRUDE_4_DEPTH, mode=Mode.SUBTRACT)


solid = part.part
